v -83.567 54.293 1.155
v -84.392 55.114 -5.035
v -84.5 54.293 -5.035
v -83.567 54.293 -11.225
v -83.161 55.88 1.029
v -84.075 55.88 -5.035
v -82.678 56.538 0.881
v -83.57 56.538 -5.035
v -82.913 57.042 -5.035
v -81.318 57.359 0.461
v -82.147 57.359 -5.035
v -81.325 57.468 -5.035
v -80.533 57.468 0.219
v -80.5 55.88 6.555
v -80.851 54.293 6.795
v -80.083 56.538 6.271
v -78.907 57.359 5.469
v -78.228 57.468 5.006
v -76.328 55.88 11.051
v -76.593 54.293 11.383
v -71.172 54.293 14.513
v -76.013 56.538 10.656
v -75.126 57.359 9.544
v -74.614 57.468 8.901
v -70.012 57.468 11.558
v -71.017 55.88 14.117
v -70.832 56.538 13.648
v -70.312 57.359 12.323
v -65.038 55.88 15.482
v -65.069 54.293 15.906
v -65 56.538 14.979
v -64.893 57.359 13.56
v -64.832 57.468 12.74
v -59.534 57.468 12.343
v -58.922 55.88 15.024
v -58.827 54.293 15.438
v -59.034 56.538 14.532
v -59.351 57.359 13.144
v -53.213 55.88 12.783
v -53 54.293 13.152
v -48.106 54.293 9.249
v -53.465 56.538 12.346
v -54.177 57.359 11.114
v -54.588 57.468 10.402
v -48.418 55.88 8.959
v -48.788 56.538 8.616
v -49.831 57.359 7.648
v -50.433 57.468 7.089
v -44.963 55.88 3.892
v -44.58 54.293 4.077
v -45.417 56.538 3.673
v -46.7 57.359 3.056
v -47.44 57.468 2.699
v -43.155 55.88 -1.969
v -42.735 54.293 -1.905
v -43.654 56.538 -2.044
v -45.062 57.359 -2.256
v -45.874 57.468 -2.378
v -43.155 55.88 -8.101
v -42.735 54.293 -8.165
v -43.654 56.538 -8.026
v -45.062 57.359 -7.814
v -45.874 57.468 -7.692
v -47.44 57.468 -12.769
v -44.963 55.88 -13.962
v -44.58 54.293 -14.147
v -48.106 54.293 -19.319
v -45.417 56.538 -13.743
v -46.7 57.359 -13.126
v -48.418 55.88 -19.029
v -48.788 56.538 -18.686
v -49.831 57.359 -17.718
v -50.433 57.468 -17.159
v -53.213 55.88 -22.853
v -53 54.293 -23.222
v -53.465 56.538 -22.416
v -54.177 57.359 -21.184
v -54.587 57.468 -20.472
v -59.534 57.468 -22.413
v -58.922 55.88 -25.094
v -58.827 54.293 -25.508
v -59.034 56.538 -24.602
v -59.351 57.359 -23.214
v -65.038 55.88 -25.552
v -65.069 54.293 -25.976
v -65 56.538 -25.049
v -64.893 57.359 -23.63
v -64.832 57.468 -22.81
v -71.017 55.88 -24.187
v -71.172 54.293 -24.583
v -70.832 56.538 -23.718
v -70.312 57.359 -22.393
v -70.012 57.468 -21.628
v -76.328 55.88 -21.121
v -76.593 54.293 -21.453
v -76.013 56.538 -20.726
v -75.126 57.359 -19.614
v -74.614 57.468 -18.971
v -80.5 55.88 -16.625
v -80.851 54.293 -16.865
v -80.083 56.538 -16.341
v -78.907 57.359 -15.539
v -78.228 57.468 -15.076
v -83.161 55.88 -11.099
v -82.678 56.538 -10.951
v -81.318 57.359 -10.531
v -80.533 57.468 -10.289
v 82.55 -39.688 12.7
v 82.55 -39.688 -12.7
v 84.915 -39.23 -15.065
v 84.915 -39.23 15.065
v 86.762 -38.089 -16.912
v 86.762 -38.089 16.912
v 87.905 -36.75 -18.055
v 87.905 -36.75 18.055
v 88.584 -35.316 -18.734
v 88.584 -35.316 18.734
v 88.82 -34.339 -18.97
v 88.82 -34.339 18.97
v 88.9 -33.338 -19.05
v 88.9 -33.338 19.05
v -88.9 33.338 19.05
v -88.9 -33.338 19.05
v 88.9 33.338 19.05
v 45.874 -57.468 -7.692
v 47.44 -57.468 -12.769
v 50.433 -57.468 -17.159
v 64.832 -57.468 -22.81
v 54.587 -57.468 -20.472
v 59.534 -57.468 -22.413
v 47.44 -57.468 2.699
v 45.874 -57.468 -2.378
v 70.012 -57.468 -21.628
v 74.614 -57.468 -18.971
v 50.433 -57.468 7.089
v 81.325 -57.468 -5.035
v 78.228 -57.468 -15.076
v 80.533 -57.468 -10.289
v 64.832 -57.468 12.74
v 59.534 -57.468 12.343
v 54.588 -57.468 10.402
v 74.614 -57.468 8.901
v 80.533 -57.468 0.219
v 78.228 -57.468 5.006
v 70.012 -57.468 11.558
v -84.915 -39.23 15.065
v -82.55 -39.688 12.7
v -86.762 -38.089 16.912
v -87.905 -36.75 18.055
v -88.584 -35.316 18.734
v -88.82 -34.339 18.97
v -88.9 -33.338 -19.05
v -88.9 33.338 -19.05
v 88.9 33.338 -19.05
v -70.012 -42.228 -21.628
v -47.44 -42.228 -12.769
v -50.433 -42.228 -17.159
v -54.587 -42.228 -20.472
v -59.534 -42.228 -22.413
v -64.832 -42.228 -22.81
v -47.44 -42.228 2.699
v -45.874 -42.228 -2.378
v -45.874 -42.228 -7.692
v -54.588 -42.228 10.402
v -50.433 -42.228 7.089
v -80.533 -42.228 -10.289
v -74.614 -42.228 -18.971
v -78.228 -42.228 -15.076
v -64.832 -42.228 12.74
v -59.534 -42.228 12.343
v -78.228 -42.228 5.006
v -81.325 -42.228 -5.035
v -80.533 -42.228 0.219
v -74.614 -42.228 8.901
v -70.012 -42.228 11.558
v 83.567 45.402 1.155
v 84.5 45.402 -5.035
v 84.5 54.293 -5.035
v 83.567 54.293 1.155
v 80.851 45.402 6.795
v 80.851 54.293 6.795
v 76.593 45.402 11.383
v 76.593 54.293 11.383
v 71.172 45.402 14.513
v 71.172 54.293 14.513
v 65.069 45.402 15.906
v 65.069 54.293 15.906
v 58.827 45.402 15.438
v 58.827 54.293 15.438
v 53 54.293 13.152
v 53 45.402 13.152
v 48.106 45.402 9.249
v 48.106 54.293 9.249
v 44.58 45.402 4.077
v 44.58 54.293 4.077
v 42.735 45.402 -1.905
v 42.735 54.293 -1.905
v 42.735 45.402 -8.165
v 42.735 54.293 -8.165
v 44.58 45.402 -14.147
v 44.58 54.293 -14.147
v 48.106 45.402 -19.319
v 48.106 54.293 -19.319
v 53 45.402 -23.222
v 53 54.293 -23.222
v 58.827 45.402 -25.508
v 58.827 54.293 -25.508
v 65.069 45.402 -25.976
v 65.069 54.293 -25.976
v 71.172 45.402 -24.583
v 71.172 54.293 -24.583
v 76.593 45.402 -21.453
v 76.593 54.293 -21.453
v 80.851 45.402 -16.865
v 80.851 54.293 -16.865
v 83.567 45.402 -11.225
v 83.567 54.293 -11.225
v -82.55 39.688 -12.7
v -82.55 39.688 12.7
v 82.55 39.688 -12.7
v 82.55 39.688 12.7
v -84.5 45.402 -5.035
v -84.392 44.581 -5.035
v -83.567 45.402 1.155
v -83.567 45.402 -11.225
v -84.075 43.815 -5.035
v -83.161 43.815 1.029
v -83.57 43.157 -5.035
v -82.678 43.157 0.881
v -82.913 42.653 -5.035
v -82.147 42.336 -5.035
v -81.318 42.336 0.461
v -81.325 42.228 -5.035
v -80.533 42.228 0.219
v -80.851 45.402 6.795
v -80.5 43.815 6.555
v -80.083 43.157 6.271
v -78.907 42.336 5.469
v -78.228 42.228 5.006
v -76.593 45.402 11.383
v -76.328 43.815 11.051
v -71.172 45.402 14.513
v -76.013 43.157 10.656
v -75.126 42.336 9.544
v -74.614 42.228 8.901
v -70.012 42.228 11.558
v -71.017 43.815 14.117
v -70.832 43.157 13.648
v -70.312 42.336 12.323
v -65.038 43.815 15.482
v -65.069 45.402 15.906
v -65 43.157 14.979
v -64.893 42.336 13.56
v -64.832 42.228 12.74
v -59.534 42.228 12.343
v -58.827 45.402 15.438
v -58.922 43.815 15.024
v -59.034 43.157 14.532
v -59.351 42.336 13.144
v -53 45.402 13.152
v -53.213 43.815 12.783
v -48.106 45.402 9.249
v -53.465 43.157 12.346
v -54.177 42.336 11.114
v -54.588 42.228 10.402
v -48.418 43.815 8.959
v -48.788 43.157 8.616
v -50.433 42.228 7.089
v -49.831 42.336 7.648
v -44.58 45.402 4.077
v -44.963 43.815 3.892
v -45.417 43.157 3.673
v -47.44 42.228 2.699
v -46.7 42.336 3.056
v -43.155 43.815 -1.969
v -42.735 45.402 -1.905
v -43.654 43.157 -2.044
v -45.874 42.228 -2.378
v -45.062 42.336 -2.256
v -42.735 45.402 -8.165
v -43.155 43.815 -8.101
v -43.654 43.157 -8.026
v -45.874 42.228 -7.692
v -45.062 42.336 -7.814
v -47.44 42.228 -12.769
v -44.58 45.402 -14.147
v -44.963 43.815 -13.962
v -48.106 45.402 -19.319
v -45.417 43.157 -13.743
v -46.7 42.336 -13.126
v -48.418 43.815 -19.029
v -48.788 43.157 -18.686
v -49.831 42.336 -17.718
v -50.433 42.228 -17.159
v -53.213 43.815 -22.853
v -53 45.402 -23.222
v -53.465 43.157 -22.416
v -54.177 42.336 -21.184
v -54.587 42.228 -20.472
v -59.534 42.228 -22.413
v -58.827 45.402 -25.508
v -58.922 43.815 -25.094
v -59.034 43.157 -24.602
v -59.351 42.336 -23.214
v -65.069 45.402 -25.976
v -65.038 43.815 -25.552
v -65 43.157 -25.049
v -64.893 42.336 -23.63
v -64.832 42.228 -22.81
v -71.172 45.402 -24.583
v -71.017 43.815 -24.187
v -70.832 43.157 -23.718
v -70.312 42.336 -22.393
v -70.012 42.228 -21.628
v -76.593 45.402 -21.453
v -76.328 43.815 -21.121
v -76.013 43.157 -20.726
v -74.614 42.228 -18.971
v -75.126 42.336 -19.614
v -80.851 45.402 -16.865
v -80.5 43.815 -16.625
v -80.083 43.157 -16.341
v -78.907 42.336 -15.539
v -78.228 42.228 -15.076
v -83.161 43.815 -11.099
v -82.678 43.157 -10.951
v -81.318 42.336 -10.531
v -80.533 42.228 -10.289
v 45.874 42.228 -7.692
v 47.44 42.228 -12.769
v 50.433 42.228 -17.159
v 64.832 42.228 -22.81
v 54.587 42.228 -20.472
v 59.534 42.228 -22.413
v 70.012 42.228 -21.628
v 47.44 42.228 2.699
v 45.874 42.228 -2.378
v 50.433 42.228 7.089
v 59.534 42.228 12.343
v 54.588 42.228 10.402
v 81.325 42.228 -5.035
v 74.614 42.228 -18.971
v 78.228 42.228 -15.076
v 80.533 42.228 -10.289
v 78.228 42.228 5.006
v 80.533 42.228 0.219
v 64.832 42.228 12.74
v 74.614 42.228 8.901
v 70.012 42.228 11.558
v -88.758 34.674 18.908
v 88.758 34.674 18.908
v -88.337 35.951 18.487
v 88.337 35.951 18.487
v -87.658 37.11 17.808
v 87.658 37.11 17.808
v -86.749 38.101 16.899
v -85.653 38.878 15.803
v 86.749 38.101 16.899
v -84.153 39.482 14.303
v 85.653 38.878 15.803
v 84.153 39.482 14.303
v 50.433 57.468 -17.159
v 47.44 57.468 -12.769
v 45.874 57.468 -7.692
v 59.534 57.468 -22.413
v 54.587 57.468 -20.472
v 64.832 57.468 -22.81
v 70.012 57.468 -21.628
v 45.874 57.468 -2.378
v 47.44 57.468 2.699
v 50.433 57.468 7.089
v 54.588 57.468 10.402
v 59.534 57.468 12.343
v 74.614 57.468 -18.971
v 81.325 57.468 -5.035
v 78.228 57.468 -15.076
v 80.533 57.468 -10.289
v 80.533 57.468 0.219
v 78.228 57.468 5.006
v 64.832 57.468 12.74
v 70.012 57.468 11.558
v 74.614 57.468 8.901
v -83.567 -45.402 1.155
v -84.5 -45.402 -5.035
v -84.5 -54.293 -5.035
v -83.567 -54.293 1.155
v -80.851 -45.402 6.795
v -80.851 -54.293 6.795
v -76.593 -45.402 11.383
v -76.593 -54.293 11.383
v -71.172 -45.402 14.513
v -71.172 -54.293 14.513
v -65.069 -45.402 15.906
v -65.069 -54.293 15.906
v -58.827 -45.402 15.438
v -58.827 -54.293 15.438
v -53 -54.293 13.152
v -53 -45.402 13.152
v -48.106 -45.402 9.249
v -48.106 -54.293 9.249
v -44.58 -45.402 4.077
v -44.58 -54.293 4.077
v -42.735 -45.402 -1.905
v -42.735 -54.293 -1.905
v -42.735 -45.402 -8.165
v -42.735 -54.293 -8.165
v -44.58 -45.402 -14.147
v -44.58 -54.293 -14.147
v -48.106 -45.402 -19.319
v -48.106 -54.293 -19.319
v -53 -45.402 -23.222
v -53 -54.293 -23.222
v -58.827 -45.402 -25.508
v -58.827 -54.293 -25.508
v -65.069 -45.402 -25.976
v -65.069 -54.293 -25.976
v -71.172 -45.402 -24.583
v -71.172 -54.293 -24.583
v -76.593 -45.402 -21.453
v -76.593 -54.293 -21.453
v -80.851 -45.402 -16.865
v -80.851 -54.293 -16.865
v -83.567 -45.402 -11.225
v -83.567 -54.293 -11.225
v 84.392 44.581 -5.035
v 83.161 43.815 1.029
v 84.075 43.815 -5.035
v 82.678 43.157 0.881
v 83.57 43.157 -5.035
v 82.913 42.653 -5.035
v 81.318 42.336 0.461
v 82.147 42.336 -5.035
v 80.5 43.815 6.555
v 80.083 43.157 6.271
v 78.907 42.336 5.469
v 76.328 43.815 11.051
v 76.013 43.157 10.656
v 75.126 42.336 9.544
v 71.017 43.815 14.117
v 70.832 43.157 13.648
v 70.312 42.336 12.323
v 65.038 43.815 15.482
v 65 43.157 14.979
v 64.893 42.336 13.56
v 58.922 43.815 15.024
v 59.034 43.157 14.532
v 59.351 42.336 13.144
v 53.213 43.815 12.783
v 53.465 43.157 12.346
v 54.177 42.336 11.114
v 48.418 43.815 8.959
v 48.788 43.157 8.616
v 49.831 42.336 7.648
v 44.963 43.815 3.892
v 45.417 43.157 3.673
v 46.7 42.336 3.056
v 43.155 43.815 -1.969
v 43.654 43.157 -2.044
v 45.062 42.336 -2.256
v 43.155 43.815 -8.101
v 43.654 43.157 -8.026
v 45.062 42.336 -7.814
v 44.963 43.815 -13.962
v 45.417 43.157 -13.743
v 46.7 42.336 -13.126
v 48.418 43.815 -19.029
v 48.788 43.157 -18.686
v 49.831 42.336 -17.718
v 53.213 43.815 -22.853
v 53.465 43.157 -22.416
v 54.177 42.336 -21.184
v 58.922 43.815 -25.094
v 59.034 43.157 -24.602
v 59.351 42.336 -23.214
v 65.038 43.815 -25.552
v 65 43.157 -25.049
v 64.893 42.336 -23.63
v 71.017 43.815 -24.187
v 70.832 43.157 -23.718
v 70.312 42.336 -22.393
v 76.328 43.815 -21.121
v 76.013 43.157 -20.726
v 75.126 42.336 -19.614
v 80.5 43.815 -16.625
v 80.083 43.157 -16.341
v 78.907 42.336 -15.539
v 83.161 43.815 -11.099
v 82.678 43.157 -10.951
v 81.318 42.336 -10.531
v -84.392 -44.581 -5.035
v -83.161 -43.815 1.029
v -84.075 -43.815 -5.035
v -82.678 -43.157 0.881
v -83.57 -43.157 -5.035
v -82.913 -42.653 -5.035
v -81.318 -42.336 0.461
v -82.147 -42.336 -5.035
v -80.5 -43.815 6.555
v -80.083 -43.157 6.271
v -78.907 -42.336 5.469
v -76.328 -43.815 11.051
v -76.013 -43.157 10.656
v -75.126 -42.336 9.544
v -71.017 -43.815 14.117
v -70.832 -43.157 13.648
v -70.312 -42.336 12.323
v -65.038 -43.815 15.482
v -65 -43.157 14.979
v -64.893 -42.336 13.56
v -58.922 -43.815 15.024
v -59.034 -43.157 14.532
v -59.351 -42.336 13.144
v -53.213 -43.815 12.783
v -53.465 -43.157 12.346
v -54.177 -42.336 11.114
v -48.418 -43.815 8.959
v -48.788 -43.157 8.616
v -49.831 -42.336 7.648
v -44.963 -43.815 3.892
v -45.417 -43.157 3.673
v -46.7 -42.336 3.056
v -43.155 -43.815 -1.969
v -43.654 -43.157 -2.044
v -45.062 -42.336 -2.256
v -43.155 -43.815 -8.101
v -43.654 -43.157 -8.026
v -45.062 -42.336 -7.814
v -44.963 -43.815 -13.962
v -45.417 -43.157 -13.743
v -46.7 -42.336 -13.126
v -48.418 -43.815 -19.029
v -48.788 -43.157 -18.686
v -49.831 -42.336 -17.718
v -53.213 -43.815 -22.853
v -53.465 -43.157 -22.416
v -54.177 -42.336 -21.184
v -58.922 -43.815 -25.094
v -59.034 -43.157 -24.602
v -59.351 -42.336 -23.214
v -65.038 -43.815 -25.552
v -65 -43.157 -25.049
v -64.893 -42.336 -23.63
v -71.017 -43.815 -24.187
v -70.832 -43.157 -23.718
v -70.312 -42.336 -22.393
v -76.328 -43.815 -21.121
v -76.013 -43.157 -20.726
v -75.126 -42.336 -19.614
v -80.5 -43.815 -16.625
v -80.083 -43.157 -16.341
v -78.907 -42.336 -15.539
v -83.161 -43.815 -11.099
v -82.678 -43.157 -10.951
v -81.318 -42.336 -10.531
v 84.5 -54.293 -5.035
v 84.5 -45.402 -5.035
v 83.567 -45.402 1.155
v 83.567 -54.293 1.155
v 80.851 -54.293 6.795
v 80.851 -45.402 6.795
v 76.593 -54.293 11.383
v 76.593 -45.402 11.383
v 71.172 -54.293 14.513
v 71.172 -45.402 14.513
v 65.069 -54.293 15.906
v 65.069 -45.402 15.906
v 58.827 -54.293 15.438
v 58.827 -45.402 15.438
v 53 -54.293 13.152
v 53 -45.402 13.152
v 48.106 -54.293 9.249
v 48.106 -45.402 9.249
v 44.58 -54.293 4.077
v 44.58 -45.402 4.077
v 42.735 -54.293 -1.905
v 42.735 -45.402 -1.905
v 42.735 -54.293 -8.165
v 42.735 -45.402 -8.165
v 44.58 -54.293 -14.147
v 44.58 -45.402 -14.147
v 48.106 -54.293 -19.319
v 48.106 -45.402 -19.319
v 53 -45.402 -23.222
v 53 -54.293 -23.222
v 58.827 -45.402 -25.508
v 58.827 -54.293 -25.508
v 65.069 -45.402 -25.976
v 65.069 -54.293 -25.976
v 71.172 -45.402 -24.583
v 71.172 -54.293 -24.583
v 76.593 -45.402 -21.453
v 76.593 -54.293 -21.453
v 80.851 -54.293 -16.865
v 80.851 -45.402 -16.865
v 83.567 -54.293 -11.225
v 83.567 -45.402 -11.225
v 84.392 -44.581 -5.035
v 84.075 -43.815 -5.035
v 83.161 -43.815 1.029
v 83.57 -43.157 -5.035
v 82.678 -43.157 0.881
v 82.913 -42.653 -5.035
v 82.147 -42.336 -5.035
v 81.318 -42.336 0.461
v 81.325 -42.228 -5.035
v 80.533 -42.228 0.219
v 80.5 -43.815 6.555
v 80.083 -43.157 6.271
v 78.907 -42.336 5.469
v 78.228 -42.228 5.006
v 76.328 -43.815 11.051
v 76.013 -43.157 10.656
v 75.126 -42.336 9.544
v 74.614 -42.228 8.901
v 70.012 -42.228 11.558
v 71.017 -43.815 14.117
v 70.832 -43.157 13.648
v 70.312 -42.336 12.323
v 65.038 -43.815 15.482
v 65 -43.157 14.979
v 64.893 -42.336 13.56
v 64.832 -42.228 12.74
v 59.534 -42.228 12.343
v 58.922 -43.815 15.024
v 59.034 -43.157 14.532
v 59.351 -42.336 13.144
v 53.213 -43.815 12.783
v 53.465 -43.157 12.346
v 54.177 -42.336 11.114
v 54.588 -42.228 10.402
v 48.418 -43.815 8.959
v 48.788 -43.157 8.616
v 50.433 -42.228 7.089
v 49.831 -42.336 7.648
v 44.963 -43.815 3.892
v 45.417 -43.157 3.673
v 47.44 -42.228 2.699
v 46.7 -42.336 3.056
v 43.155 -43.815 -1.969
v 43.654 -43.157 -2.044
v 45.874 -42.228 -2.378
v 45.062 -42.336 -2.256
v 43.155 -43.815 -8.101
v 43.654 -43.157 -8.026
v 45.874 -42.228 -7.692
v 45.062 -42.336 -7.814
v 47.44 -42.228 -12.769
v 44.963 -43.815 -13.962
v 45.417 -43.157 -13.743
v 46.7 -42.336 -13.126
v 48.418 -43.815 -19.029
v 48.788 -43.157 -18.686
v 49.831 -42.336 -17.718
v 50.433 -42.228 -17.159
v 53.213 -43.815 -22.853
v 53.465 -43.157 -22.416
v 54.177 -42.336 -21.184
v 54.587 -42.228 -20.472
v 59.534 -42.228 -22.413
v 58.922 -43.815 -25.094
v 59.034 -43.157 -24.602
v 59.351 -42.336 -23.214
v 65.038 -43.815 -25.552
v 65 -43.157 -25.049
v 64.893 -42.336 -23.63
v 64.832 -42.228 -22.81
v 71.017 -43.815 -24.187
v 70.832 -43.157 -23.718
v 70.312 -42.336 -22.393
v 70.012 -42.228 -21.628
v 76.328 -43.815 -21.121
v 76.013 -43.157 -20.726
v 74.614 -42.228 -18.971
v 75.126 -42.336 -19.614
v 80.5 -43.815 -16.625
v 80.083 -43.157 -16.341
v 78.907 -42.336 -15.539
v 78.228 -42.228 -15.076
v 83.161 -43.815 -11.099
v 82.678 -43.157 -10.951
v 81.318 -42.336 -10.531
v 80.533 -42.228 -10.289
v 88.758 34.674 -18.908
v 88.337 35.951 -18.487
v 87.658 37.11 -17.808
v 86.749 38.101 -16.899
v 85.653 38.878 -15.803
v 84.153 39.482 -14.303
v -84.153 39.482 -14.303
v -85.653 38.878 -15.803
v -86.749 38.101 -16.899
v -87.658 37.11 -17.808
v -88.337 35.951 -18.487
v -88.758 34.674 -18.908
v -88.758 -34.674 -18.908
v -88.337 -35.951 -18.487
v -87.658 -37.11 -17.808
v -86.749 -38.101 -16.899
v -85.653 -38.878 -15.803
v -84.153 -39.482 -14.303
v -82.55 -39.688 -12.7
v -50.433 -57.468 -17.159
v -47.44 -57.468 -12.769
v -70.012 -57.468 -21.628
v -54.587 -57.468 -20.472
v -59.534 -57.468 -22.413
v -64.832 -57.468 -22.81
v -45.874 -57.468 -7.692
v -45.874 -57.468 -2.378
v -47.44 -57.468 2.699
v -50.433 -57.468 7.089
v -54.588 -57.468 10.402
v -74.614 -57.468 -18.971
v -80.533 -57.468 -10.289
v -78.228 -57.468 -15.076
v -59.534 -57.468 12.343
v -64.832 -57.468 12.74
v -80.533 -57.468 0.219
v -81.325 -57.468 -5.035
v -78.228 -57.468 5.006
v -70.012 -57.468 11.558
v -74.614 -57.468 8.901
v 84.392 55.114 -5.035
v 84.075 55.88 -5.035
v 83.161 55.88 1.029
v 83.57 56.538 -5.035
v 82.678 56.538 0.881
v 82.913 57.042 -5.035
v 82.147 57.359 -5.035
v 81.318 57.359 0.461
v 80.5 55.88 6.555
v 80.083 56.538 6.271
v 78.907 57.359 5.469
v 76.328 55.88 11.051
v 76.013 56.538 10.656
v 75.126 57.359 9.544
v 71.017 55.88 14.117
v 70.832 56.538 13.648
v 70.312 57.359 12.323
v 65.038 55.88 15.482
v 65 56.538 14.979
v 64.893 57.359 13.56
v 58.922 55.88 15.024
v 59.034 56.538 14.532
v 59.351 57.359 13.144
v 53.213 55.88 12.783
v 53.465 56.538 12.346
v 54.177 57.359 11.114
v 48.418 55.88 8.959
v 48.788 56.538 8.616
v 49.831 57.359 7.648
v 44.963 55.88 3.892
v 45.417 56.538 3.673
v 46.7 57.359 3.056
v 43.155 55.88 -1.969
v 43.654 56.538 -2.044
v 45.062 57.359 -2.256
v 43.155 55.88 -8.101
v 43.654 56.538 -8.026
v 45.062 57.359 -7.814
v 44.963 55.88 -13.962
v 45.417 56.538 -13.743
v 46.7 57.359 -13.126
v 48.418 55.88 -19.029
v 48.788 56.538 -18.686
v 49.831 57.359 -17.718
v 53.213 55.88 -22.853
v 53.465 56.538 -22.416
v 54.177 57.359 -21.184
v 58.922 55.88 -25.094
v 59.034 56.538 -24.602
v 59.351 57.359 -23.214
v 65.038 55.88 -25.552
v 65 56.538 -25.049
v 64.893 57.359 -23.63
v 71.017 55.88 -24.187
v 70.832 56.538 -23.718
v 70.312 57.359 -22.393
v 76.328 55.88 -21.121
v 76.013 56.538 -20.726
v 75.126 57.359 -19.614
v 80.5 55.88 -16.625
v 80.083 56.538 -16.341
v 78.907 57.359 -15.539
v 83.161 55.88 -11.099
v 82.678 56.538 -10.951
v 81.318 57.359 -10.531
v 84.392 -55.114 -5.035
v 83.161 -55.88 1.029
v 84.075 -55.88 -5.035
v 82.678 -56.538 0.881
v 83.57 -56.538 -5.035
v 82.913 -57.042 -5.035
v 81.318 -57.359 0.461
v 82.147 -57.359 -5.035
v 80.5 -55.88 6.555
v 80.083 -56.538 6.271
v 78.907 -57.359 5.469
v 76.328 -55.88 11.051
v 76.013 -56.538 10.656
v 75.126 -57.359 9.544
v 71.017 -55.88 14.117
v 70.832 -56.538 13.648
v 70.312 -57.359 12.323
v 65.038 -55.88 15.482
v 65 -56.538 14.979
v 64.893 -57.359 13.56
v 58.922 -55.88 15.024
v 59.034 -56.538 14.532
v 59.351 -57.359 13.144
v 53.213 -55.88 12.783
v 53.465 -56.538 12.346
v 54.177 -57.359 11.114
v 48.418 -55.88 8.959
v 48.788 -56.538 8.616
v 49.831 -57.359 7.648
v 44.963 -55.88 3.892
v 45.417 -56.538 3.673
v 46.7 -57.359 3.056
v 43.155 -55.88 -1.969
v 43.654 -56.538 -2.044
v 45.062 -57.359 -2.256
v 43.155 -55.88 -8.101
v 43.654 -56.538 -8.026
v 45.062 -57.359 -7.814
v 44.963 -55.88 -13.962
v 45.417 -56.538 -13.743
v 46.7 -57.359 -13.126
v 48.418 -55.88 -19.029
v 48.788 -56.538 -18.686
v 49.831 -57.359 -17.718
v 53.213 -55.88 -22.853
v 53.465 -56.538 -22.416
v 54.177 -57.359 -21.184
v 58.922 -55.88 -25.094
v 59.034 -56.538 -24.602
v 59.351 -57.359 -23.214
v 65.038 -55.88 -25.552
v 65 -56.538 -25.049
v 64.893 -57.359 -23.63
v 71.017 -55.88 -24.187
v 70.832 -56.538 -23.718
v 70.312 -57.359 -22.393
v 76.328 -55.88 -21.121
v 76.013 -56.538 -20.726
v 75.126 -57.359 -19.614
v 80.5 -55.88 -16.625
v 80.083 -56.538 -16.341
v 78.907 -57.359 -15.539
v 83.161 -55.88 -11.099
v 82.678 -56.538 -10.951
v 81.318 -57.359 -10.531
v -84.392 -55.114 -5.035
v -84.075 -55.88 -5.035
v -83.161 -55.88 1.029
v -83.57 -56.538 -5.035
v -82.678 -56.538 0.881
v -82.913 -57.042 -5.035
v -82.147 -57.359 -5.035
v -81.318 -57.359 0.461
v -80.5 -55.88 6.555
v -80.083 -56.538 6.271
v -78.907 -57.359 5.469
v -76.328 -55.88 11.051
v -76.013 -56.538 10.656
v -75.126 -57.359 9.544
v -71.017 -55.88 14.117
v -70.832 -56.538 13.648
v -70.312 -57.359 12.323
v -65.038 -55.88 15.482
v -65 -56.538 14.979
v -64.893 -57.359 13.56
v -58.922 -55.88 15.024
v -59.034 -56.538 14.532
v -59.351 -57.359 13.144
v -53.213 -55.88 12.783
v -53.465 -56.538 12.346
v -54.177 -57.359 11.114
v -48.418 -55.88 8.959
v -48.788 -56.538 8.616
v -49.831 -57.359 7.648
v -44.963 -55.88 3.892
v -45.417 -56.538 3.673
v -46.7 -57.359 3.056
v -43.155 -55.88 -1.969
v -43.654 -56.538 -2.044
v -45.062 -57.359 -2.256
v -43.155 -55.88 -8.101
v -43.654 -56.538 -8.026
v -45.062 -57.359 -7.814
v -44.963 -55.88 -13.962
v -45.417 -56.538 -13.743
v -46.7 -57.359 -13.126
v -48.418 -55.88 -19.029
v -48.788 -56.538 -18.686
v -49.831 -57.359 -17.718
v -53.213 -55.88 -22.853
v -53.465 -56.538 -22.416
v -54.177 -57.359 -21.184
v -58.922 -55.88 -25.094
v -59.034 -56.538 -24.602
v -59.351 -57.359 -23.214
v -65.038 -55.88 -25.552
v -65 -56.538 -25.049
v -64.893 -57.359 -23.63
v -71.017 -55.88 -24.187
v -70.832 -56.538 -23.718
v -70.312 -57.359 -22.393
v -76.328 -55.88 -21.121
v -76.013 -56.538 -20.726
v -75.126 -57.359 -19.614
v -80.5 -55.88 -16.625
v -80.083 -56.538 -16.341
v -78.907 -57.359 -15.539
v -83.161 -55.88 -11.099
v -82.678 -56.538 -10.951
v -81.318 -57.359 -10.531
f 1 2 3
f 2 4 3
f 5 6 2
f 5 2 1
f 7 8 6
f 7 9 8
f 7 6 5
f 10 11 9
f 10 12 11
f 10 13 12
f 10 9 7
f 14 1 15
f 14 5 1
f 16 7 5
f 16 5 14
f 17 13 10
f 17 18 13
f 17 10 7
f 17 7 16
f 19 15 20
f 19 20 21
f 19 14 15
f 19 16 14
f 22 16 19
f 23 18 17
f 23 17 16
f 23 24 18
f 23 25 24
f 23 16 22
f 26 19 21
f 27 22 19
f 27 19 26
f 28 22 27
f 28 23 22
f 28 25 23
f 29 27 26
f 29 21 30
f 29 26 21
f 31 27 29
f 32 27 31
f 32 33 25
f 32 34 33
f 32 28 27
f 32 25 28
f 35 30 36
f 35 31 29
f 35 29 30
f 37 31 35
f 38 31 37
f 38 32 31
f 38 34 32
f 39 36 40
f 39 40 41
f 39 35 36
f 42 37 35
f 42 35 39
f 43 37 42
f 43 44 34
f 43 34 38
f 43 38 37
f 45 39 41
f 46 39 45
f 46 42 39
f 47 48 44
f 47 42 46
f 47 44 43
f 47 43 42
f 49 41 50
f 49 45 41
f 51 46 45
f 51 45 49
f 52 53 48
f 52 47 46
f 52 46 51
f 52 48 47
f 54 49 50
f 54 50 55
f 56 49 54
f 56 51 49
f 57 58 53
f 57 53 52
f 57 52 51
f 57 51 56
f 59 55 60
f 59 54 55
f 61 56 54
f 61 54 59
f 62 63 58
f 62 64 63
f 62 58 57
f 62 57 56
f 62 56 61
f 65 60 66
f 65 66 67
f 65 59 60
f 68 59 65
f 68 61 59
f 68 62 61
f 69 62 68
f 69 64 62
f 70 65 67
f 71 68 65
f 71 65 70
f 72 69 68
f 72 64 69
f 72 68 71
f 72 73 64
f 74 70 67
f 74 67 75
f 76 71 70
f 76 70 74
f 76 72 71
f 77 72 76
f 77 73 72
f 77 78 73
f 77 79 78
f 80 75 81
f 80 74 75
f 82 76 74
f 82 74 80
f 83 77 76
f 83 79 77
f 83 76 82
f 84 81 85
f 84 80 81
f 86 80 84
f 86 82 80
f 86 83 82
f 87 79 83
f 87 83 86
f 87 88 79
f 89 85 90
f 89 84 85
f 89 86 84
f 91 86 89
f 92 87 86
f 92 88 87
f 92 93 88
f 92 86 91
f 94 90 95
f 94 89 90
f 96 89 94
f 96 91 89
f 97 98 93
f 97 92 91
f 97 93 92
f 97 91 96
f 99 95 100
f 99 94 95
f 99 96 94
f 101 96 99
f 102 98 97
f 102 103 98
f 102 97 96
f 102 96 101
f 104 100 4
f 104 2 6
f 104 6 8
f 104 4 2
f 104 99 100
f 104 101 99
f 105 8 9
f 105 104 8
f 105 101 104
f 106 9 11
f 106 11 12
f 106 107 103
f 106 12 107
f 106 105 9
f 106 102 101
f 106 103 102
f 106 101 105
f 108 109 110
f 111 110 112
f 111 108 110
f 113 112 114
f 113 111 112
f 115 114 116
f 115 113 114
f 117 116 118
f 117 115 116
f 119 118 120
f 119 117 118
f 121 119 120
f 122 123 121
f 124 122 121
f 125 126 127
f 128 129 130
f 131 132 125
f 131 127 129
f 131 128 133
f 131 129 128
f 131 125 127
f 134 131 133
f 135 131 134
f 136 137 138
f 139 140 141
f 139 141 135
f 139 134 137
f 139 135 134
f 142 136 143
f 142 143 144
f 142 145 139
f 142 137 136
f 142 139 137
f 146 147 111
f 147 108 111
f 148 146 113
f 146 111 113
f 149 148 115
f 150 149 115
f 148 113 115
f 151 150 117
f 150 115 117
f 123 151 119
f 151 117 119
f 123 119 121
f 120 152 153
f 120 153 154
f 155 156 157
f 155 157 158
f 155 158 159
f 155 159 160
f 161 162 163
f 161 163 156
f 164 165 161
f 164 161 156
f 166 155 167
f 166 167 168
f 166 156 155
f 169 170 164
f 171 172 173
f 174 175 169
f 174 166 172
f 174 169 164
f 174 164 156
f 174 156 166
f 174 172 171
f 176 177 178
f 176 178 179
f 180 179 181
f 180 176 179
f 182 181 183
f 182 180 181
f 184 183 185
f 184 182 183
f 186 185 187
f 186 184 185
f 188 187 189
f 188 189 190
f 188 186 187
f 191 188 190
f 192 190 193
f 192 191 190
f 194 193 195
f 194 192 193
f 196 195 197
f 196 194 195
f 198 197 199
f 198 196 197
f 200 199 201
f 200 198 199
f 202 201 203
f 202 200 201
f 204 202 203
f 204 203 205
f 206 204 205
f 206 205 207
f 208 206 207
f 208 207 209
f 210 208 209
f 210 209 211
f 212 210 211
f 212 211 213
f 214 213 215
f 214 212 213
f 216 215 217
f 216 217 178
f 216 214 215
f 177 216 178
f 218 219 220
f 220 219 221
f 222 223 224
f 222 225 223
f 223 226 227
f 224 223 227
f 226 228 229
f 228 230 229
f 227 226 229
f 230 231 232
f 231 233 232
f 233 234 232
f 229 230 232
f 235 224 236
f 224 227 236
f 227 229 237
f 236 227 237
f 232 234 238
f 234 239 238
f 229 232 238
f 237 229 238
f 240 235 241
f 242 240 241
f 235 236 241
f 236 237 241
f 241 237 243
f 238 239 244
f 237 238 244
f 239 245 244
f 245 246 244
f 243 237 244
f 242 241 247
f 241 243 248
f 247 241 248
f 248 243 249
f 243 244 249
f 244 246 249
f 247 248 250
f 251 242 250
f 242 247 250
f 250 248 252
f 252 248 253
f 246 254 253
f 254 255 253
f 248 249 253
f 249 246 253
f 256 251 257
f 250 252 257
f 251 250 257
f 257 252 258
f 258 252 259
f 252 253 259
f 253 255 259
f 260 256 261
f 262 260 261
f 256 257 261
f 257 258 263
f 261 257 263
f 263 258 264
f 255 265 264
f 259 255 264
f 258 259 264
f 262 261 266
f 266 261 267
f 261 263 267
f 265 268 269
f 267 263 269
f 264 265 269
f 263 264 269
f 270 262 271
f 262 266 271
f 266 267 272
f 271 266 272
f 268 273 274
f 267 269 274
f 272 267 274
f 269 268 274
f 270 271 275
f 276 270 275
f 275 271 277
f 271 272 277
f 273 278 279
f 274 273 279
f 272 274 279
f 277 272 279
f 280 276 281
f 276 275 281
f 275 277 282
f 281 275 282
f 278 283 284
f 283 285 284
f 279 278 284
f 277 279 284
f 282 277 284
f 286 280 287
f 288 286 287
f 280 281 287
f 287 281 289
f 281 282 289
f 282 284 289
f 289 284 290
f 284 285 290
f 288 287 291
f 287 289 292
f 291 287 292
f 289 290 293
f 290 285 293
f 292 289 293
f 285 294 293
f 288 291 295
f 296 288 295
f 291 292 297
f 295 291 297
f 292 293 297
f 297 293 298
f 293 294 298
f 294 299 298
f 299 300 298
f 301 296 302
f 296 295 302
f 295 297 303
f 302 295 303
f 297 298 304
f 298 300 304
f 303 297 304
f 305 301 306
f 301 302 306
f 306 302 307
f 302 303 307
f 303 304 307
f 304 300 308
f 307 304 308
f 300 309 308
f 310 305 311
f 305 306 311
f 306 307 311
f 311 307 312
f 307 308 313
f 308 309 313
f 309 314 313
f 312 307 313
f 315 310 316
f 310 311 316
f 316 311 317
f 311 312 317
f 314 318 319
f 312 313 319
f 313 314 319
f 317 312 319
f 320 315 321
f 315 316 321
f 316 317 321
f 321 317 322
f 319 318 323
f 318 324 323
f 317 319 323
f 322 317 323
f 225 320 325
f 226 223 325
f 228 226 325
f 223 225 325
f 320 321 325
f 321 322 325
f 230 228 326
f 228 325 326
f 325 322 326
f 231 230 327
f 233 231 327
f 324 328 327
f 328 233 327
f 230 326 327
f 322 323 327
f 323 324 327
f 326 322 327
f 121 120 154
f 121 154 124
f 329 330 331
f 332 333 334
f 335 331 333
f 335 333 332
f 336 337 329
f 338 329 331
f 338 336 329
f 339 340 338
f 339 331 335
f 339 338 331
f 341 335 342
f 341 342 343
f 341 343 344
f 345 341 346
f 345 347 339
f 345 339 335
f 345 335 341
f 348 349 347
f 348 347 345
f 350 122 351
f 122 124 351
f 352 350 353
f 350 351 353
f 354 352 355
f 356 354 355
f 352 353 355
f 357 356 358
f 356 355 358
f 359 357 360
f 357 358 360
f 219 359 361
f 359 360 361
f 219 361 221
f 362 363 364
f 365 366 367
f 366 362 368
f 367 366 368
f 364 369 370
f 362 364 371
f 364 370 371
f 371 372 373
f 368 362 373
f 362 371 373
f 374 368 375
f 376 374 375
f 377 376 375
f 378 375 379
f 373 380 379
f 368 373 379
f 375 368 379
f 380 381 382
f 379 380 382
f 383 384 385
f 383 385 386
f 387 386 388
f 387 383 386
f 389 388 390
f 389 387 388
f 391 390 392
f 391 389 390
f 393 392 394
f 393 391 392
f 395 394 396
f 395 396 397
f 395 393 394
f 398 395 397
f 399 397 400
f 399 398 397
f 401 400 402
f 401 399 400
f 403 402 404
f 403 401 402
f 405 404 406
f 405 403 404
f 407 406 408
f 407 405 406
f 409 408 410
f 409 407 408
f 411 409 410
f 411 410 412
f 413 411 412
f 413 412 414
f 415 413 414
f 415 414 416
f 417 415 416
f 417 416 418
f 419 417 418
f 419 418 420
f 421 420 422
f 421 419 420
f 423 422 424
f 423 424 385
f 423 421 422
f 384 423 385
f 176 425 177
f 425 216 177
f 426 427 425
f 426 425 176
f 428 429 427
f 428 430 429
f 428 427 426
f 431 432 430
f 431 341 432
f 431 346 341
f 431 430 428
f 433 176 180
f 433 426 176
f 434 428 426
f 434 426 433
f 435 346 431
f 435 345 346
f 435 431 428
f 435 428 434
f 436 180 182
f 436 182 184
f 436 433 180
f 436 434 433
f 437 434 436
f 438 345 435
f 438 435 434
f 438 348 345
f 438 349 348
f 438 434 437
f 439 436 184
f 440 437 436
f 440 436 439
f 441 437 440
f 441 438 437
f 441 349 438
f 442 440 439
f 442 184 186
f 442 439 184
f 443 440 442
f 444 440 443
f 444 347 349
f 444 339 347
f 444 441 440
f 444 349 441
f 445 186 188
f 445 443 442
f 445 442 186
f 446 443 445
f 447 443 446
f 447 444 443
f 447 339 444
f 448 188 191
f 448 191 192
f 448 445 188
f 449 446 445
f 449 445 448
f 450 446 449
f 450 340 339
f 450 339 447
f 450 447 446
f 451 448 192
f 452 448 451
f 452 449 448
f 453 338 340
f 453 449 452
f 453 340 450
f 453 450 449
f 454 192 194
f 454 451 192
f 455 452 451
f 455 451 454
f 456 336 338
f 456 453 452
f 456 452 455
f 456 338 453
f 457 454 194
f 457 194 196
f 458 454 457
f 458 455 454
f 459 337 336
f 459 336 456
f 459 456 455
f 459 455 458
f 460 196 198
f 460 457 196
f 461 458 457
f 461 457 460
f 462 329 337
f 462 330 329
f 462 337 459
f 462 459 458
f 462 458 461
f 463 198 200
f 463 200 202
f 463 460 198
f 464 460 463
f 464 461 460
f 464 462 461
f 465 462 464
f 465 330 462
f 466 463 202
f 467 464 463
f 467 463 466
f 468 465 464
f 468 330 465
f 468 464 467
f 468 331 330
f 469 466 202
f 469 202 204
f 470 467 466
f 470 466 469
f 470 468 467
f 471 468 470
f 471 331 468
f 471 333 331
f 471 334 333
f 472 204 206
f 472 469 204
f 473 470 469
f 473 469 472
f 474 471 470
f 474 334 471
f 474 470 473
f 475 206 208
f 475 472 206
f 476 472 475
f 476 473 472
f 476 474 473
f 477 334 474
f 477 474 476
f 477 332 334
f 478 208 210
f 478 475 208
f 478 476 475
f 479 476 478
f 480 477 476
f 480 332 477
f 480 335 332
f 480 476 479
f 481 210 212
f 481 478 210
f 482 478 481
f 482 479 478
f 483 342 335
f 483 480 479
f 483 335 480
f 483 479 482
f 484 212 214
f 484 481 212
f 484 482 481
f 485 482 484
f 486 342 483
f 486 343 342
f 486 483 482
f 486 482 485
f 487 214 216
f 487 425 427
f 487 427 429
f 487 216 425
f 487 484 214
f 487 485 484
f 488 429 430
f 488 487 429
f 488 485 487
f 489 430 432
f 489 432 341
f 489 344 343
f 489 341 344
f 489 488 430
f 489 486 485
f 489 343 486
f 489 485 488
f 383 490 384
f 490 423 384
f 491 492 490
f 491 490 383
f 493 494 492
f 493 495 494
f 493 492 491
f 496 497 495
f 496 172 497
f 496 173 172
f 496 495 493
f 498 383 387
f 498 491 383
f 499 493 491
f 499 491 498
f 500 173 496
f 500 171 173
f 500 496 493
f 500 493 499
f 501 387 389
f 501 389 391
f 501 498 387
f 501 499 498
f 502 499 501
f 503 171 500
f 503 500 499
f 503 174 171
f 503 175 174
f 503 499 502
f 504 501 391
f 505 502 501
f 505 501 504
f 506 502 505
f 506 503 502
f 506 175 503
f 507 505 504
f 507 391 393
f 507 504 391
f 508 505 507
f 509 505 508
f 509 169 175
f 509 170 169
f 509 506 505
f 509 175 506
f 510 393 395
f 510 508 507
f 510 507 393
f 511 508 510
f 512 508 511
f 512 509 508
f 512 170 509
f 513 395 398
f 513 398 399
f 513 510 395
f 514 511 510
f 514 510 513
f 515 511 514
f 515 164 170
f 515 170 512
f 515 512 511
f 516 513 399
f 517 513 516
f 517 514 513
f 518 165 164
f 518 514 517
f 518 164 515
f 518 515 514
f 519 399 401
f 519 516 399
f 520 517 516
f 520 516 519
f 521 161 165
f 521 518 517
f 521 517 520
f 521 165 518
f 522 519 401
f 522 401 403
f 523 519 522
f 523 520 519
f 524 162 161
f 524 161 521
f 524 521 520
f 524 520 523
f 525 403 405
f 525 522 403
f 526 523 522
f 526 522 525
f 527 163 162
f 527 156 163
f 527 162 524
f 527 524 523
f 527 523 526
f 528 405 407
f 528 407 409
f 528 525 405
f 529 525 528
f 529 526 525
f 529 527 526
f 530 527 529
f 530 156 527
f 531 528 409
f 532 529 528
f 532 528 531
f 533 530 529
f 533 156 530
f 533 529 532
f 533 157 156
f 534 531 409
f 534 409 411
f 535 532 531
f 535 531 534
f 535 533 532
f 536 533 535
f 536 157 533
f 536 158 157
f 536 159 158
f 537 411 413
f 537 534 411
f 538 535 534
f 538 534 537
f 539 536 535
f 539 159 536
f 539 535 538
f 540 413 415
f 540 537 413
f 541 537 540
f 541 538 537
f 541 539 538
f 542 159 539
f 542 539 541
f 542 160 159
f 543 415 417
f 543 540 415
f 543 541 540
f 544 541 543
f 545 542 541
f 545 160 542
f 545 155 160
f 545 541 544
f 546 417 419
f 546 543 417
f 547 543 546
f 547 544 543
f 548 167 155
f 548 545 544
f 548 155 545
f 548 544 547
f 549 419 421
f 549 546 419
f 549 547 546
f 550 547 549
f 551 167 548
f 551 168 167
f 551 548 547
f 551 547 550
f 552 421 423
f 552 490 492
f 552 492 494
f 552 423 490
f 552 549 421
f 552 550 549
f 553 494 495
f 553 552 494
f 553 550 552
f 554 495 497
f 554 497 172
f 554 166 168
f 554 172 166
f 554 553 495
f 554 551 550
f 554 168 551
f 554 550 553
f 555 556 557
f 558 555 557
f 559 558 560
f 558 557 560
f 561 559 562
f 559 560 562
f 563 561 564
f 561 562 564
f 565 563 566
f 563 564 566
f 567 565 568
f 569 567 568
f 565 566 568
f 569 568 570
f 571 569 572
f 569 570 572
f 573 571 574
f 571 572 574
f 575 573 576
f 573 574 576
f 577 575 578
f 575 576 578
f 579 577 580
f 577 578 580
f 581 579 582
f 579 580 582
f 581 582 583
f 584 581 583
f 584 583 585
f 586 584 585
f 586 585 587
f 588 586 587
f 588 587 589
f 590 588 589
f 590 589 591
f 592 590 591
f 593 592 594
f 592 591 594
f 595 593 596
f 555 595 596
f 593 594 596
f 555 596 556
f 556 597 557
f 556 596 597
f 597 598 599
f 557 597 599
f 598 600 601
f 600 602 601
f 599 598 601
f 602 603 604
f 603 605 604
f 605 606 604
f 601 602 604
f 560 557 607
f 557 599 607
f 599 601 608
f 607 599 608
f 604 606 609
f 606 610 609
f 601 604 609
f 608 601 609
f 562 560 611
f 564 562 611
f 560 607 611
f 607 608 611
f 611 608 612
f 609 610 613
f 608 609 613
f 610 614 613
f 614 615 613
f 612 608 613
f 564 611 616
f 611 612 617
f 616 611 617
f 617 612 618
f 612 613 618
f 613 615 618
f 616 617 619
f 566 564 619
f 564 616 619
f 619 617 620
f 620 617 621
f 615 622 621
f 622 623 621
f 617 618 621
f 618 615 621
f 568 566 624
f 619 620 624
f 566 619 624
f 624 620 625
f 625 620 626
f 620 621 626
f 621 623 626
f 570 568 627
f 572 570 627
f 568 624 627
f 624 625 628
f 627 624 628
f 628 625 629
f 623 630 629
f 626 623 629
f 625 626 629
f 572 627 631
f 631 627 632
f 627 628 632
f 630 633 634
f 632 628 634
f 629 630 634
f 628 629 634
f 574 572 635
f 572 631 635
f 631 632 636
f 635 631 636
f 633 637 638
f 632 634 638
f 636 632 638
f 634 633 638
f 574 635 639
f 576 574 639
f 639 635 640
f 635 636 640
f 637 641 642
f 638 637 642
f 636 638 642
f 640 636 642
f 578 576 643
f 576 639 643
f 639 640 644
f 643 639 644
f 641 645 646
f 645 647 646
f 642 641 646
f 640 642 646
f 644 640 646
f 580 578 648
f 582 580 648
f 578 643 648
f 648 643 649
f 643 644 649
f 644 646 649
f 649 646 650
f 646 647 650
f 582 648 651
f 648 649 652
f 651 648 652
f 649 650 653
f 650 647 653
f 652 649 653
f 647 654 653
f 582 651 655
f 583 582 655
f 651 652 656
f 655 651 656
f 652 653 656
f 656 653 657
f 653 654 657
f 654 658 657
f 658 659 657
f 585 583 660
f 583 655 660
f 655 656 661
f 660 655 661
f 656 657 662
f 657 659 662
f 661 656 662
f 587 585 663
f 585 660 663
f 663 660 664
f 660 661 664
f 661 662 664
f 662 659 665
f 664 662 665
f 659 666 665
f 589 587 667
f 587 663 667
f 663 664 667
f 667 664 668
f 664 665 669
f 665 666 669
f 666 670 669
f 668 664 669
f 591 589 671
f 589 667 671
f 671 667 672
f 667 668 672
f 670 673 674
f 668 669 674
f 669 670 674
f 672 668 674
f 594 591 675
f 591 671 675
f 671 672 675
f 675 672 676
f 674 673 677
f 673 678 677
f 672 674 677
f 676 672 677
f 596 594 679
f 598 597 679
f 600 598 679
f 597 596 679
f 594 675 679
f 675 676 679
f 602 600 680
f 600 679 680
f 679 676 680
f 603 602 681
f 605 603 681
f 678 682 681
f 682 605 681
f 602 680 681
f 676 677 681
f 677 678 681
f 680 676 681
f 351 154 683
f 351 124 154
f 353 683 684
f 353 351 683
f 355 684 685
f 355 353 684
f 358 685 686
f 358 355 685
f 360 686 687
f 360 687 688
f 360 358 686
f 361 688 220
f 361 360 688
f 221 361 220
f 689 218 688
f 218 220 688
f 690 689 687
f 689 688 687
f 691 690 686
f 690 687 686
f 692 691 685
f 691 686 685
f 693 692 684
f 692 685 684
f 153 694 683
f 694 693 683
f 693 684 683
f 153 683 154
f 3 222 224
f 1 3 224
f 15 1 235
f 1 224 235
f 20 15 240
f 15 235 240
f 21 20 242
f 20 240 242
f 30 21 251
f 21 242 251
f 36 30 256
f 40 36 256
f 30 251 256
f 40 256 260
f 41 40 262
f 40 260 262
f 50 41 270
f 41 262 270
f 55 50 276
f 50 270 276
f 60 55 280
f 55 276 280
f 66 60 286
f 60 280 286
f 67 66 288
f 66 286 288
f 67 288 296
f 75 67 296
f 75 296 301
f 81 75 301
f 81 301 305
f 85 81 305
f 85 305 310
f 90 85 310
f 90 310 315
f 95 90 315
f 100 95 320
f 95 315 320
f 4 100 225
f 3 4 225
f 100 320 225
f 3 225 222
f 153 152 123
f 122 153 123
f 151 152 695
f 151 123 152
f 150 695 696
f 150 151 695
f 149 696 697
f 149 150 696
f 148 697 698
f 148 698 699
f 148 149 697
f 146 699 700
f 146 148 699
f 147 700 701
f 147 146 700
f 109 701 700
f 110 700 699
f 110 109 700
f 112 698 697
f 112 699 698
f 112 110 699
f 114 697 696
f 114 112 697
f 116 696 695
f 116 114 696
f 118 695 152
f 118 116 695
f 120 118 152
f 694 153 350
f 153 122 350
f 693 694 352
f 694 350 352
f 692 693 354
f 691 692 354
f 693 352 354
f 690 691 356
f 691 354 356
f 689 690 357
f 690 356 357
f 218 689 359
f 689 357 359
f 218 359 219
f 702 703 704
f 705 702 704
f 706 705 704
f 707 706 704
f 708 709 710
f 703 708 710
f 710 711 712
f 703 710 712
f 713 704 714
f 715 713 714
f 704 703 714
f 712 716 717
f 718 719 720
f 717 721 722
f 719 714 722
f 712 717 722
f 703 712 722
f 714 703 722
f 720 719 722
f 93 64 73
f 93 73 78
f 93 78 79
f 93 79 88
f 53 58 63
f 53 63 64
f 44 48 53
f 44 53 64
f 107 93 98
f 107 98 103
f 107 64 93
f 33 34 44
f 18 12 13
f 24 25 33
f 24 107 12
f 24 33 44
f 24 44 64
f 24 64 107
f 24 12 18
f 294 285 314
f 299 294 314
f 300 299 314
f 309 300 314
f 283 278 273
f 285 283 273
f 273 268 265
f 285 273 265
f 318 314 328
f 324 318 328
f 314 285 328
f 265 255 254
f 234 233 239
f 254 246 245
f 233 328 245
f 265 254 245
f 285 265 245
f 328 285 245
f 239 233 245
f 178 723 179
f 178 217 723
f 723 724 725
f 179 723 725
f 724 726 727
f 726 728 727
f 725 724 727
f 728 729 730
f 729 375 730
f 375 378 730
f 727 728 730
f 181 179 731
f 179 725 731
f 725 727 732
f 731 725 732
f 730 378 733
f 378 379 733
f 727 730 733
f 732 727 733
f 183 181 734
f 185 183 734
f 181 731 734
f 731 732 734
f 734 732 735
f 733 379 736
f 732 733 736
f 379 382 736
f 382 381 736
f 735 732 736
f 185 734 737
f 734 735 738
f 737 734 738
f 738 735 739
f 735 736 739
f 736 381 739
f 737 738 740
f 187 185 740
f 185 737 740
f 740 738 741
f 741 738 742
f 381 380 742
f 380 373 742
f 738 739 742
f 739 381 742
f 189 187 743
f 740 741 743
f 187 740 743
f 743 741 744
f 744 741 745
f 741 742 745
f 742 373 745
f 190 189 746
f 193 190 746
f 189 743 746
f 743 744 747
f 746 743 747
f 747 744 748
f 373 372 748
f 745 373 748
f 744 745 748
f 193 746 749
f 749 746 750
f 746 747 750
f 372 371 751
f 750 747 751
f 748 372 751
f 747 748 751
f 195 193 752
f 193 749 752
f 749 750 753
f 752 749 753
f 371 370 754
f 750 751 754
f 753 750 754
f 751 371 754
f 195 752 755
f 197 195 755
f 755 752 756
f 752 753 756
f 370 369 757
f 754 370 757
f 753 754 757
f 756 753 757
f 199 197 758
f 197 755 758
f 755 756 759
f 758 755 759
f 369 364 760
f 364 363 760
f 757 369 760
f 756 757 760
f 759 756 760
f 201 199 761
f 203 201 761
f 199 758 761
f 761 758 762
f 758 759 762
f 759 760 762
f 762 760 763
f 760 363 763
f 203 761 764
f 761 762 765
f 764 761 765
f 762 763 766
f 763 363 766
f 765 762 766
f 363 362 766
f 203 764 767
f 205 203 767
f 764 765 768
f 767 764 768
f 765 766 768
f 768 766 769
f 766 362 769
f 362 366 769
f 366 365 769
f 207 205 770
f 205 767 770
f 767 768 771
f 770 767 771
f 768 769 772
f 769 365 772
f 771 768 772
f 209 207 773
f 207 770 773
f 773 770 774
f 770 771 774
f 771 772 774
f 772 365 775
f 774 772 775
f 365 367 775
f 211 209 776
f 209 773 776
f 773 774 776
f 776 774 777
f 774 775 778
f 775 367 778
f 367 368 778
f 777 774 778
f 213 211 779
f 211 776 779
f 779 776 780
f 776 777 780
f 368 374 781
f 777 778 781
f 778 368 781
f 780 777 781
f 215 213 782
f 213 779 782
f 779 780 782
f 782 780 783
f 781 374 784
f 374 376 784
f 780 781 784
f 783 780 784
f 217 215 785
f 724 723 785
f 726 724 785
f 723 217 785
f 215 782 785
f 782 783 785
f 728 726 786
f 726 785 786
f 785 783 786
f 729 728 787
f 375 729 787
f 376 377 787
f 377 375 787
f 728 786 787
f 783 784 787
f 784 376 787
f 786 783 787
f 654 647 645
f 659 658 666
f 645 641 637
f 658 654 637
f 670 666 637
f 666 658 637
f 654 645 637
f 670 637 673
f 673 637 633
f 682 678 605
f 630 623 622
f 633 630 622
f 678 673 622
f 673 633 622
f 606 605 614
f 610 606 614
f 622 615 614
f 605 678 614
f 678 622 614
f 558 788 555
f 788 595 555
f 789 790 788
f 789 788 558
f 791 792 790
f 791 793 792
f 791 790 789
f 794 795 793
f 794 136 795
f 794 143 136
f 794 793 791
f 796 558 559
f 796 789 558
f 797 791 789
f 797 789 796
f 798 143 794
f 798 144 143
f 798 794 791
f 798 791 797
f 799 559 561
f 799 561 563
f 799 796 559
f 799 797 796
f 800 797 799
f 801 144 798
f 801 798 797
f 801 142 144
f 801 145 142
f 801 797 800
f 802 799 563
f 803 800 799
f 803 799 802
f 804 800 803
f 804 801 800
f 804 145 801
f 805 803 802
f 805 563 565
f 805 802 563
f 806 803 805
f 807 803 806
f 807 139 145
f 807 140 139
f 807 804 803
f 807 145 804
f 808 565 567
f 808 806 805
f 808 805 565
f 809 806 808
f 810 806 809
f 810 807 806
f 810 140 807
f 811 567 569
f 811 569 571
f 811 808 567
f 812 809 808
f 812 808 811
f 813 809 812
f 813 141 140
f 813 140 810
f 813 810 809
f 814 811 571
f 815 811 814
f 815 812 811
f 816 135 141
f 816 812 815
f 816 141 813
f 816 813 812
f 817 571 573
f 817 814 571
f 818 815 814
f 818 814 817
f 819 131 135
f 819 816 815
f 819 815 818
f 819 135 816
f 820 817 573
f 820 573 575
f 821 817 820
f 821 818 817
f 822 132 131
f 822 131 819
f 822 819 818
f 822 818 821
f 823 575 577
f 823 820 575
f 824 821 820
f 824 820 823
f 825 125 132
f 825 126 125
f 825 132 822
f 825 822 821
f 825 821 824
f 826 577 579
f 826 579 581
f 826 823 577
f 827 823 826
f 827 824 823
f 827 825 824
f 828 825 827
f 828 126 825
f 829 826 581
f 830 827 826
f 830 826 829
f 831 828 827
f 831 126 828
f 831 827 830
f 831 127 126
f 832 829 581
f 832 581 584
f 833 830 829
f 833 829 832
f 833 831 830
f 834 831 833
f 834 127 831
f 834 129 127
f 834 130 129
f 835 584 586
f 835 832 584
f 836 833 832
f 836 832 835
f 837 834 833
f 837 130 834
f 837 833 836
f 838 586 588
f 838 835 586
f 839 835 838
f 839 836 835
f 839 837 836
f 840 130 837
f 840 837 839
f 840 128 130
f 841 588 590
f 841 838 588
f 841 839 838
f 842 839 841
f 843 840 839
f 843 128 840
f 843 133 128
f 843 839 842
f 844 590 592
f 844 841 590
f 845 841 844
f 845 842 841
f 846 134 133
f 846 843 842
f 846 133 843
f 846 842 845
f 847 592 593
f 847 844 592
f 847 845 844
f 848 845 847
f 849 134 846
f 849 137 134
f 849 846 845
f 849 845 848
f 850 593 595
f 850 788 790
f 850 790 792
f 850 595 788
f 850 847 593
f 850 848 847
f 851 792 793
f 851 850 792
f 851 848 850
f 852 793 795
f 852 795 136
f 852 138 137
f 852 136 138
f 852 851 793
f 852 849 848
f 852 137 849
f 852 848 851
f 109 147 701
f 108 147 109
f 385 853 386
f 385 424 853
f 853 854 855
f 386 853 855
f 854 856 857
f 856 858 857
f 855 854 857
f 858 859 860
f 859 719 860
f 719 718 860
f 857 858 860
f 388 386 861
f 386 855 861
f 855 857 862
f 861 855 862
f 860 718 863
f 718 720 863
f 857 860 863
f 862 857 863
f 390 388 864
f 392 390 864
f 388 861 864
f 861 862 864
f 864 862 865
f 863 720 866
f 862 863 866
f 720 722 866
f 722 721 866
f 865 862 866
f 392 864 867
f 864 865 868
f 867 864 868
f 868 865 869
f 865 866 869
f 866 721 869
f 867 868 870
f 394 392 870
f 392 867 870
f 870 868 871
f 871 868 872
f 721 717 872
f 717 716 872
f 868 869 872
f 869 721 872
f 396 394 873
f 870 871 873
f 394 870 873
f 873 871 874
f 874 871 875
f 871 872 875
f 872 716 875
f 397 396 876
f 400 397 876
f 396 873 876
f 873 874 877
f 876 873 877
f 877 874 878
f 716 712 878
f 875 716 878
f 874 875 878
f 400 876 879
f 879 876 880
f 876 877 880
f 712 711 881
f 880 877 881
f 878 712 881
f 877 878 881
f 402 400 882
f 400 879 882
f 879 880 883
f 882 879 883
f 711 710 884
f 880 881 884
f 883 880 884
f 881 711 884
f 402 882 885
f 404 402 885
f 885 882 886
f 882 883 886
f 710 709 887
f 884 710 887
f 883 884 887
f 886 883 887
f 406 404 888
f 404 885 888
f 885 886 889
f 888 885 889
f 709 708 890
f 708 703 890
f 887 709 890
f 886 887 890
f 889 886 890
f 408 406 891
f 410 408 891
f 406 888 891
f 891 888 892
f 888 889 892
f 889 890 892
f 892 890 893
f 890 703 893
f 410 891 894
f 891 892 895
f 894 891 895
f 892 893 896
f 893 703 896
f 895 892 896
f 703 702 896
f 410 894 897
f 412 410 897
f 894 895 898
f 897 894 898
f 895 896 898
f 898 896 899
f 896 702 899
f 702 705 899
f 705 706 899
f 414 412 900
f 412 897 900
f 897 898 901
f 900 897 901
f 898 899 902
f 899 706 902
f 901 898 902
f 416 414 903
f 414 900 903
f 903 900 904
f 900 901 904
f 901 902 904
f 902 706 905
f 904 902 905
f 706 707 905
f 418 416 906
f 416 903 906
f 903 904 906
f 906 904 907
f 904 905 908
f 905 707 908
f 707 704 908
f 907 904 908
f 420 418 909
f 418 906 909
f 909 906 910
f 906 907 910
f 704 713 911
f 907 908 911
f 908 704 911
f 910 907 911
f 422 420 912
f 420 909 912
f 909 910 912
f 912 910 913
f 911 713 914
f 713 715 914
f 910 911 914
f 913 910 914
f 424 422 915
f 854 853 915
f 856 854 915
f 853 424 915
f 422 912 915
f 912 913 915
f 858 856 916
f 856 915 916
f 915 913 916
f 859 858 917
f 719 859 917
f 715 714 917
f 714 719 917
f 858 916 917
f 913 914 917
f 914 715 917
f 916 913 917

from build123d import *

# Parameters (mm, degrees)
F0_W     = 177.8
F0_H     = 38.1
F2_DEPTH = 39.6875
F4_R     = 21
F5_DEPTH = 15.24
F6_R     = 6.35
F7_R     = 3.175


with BuildPart() as f2:
    # F0 (on Front) → F2 (new body, symmetric)
    with BuildSketch(Plane.XZ):
        Rectangle(F0_W, F0_H)
    extrude(amount=F2_DEPTH, both=True)

    # F6
    f6_edges = [f2.edges().sort_by_distance(p)[0] for p in [
        (0, -39.6875, 19.05),
        (-88.9, -39.6875, 0),
        (0, -39.6875, -19.05),
        (88.9, -39.6875, 0),
        (88.9, 39.6875, 0),
        (0, 39.6875, 19.05),
        (-88.9, 39.6875, 0),
        (0, 39.6875, -19.05),
    ]]
    fillet(f6_edges, radius=F6_R)


with BuildPart() as f5:
    # F4 (on offset) → F5 (new body)
    with BuildSketch(Plane.XZ.offset(42.2275)):
        with Locations((63.5, -5.035)):
            Circle(F4_R)
    extrude(amount=F5_DEPTH)

    # F7
    f7_edges = [f5.edges().sort_by_distance(p)[0] for p in [
        (42.5, -57.4675, -5.035),
        (84.5, -49.8475, -5.035),
        (42.5, -42.2275, -5.035),
    ]]
    fillet(f7_edges, radius=F7_R)


with BuildPart() as f8_1:
    # F8: instance of F5
    add(f5.part.mirror(Plane.XZ))


with BuildPart() as f9_1:
    # F9: instance of F5
    add(f5.part.mirror(Plane.YZ))


with BuildPart() as f9_2:
    # F9: instance of F8_1
    add(f8_1.part.mirror(Plane.YZ))


solid = Compound([f2.part, f5.part, f8_1.part, f9_1.part, f9_2.part])
